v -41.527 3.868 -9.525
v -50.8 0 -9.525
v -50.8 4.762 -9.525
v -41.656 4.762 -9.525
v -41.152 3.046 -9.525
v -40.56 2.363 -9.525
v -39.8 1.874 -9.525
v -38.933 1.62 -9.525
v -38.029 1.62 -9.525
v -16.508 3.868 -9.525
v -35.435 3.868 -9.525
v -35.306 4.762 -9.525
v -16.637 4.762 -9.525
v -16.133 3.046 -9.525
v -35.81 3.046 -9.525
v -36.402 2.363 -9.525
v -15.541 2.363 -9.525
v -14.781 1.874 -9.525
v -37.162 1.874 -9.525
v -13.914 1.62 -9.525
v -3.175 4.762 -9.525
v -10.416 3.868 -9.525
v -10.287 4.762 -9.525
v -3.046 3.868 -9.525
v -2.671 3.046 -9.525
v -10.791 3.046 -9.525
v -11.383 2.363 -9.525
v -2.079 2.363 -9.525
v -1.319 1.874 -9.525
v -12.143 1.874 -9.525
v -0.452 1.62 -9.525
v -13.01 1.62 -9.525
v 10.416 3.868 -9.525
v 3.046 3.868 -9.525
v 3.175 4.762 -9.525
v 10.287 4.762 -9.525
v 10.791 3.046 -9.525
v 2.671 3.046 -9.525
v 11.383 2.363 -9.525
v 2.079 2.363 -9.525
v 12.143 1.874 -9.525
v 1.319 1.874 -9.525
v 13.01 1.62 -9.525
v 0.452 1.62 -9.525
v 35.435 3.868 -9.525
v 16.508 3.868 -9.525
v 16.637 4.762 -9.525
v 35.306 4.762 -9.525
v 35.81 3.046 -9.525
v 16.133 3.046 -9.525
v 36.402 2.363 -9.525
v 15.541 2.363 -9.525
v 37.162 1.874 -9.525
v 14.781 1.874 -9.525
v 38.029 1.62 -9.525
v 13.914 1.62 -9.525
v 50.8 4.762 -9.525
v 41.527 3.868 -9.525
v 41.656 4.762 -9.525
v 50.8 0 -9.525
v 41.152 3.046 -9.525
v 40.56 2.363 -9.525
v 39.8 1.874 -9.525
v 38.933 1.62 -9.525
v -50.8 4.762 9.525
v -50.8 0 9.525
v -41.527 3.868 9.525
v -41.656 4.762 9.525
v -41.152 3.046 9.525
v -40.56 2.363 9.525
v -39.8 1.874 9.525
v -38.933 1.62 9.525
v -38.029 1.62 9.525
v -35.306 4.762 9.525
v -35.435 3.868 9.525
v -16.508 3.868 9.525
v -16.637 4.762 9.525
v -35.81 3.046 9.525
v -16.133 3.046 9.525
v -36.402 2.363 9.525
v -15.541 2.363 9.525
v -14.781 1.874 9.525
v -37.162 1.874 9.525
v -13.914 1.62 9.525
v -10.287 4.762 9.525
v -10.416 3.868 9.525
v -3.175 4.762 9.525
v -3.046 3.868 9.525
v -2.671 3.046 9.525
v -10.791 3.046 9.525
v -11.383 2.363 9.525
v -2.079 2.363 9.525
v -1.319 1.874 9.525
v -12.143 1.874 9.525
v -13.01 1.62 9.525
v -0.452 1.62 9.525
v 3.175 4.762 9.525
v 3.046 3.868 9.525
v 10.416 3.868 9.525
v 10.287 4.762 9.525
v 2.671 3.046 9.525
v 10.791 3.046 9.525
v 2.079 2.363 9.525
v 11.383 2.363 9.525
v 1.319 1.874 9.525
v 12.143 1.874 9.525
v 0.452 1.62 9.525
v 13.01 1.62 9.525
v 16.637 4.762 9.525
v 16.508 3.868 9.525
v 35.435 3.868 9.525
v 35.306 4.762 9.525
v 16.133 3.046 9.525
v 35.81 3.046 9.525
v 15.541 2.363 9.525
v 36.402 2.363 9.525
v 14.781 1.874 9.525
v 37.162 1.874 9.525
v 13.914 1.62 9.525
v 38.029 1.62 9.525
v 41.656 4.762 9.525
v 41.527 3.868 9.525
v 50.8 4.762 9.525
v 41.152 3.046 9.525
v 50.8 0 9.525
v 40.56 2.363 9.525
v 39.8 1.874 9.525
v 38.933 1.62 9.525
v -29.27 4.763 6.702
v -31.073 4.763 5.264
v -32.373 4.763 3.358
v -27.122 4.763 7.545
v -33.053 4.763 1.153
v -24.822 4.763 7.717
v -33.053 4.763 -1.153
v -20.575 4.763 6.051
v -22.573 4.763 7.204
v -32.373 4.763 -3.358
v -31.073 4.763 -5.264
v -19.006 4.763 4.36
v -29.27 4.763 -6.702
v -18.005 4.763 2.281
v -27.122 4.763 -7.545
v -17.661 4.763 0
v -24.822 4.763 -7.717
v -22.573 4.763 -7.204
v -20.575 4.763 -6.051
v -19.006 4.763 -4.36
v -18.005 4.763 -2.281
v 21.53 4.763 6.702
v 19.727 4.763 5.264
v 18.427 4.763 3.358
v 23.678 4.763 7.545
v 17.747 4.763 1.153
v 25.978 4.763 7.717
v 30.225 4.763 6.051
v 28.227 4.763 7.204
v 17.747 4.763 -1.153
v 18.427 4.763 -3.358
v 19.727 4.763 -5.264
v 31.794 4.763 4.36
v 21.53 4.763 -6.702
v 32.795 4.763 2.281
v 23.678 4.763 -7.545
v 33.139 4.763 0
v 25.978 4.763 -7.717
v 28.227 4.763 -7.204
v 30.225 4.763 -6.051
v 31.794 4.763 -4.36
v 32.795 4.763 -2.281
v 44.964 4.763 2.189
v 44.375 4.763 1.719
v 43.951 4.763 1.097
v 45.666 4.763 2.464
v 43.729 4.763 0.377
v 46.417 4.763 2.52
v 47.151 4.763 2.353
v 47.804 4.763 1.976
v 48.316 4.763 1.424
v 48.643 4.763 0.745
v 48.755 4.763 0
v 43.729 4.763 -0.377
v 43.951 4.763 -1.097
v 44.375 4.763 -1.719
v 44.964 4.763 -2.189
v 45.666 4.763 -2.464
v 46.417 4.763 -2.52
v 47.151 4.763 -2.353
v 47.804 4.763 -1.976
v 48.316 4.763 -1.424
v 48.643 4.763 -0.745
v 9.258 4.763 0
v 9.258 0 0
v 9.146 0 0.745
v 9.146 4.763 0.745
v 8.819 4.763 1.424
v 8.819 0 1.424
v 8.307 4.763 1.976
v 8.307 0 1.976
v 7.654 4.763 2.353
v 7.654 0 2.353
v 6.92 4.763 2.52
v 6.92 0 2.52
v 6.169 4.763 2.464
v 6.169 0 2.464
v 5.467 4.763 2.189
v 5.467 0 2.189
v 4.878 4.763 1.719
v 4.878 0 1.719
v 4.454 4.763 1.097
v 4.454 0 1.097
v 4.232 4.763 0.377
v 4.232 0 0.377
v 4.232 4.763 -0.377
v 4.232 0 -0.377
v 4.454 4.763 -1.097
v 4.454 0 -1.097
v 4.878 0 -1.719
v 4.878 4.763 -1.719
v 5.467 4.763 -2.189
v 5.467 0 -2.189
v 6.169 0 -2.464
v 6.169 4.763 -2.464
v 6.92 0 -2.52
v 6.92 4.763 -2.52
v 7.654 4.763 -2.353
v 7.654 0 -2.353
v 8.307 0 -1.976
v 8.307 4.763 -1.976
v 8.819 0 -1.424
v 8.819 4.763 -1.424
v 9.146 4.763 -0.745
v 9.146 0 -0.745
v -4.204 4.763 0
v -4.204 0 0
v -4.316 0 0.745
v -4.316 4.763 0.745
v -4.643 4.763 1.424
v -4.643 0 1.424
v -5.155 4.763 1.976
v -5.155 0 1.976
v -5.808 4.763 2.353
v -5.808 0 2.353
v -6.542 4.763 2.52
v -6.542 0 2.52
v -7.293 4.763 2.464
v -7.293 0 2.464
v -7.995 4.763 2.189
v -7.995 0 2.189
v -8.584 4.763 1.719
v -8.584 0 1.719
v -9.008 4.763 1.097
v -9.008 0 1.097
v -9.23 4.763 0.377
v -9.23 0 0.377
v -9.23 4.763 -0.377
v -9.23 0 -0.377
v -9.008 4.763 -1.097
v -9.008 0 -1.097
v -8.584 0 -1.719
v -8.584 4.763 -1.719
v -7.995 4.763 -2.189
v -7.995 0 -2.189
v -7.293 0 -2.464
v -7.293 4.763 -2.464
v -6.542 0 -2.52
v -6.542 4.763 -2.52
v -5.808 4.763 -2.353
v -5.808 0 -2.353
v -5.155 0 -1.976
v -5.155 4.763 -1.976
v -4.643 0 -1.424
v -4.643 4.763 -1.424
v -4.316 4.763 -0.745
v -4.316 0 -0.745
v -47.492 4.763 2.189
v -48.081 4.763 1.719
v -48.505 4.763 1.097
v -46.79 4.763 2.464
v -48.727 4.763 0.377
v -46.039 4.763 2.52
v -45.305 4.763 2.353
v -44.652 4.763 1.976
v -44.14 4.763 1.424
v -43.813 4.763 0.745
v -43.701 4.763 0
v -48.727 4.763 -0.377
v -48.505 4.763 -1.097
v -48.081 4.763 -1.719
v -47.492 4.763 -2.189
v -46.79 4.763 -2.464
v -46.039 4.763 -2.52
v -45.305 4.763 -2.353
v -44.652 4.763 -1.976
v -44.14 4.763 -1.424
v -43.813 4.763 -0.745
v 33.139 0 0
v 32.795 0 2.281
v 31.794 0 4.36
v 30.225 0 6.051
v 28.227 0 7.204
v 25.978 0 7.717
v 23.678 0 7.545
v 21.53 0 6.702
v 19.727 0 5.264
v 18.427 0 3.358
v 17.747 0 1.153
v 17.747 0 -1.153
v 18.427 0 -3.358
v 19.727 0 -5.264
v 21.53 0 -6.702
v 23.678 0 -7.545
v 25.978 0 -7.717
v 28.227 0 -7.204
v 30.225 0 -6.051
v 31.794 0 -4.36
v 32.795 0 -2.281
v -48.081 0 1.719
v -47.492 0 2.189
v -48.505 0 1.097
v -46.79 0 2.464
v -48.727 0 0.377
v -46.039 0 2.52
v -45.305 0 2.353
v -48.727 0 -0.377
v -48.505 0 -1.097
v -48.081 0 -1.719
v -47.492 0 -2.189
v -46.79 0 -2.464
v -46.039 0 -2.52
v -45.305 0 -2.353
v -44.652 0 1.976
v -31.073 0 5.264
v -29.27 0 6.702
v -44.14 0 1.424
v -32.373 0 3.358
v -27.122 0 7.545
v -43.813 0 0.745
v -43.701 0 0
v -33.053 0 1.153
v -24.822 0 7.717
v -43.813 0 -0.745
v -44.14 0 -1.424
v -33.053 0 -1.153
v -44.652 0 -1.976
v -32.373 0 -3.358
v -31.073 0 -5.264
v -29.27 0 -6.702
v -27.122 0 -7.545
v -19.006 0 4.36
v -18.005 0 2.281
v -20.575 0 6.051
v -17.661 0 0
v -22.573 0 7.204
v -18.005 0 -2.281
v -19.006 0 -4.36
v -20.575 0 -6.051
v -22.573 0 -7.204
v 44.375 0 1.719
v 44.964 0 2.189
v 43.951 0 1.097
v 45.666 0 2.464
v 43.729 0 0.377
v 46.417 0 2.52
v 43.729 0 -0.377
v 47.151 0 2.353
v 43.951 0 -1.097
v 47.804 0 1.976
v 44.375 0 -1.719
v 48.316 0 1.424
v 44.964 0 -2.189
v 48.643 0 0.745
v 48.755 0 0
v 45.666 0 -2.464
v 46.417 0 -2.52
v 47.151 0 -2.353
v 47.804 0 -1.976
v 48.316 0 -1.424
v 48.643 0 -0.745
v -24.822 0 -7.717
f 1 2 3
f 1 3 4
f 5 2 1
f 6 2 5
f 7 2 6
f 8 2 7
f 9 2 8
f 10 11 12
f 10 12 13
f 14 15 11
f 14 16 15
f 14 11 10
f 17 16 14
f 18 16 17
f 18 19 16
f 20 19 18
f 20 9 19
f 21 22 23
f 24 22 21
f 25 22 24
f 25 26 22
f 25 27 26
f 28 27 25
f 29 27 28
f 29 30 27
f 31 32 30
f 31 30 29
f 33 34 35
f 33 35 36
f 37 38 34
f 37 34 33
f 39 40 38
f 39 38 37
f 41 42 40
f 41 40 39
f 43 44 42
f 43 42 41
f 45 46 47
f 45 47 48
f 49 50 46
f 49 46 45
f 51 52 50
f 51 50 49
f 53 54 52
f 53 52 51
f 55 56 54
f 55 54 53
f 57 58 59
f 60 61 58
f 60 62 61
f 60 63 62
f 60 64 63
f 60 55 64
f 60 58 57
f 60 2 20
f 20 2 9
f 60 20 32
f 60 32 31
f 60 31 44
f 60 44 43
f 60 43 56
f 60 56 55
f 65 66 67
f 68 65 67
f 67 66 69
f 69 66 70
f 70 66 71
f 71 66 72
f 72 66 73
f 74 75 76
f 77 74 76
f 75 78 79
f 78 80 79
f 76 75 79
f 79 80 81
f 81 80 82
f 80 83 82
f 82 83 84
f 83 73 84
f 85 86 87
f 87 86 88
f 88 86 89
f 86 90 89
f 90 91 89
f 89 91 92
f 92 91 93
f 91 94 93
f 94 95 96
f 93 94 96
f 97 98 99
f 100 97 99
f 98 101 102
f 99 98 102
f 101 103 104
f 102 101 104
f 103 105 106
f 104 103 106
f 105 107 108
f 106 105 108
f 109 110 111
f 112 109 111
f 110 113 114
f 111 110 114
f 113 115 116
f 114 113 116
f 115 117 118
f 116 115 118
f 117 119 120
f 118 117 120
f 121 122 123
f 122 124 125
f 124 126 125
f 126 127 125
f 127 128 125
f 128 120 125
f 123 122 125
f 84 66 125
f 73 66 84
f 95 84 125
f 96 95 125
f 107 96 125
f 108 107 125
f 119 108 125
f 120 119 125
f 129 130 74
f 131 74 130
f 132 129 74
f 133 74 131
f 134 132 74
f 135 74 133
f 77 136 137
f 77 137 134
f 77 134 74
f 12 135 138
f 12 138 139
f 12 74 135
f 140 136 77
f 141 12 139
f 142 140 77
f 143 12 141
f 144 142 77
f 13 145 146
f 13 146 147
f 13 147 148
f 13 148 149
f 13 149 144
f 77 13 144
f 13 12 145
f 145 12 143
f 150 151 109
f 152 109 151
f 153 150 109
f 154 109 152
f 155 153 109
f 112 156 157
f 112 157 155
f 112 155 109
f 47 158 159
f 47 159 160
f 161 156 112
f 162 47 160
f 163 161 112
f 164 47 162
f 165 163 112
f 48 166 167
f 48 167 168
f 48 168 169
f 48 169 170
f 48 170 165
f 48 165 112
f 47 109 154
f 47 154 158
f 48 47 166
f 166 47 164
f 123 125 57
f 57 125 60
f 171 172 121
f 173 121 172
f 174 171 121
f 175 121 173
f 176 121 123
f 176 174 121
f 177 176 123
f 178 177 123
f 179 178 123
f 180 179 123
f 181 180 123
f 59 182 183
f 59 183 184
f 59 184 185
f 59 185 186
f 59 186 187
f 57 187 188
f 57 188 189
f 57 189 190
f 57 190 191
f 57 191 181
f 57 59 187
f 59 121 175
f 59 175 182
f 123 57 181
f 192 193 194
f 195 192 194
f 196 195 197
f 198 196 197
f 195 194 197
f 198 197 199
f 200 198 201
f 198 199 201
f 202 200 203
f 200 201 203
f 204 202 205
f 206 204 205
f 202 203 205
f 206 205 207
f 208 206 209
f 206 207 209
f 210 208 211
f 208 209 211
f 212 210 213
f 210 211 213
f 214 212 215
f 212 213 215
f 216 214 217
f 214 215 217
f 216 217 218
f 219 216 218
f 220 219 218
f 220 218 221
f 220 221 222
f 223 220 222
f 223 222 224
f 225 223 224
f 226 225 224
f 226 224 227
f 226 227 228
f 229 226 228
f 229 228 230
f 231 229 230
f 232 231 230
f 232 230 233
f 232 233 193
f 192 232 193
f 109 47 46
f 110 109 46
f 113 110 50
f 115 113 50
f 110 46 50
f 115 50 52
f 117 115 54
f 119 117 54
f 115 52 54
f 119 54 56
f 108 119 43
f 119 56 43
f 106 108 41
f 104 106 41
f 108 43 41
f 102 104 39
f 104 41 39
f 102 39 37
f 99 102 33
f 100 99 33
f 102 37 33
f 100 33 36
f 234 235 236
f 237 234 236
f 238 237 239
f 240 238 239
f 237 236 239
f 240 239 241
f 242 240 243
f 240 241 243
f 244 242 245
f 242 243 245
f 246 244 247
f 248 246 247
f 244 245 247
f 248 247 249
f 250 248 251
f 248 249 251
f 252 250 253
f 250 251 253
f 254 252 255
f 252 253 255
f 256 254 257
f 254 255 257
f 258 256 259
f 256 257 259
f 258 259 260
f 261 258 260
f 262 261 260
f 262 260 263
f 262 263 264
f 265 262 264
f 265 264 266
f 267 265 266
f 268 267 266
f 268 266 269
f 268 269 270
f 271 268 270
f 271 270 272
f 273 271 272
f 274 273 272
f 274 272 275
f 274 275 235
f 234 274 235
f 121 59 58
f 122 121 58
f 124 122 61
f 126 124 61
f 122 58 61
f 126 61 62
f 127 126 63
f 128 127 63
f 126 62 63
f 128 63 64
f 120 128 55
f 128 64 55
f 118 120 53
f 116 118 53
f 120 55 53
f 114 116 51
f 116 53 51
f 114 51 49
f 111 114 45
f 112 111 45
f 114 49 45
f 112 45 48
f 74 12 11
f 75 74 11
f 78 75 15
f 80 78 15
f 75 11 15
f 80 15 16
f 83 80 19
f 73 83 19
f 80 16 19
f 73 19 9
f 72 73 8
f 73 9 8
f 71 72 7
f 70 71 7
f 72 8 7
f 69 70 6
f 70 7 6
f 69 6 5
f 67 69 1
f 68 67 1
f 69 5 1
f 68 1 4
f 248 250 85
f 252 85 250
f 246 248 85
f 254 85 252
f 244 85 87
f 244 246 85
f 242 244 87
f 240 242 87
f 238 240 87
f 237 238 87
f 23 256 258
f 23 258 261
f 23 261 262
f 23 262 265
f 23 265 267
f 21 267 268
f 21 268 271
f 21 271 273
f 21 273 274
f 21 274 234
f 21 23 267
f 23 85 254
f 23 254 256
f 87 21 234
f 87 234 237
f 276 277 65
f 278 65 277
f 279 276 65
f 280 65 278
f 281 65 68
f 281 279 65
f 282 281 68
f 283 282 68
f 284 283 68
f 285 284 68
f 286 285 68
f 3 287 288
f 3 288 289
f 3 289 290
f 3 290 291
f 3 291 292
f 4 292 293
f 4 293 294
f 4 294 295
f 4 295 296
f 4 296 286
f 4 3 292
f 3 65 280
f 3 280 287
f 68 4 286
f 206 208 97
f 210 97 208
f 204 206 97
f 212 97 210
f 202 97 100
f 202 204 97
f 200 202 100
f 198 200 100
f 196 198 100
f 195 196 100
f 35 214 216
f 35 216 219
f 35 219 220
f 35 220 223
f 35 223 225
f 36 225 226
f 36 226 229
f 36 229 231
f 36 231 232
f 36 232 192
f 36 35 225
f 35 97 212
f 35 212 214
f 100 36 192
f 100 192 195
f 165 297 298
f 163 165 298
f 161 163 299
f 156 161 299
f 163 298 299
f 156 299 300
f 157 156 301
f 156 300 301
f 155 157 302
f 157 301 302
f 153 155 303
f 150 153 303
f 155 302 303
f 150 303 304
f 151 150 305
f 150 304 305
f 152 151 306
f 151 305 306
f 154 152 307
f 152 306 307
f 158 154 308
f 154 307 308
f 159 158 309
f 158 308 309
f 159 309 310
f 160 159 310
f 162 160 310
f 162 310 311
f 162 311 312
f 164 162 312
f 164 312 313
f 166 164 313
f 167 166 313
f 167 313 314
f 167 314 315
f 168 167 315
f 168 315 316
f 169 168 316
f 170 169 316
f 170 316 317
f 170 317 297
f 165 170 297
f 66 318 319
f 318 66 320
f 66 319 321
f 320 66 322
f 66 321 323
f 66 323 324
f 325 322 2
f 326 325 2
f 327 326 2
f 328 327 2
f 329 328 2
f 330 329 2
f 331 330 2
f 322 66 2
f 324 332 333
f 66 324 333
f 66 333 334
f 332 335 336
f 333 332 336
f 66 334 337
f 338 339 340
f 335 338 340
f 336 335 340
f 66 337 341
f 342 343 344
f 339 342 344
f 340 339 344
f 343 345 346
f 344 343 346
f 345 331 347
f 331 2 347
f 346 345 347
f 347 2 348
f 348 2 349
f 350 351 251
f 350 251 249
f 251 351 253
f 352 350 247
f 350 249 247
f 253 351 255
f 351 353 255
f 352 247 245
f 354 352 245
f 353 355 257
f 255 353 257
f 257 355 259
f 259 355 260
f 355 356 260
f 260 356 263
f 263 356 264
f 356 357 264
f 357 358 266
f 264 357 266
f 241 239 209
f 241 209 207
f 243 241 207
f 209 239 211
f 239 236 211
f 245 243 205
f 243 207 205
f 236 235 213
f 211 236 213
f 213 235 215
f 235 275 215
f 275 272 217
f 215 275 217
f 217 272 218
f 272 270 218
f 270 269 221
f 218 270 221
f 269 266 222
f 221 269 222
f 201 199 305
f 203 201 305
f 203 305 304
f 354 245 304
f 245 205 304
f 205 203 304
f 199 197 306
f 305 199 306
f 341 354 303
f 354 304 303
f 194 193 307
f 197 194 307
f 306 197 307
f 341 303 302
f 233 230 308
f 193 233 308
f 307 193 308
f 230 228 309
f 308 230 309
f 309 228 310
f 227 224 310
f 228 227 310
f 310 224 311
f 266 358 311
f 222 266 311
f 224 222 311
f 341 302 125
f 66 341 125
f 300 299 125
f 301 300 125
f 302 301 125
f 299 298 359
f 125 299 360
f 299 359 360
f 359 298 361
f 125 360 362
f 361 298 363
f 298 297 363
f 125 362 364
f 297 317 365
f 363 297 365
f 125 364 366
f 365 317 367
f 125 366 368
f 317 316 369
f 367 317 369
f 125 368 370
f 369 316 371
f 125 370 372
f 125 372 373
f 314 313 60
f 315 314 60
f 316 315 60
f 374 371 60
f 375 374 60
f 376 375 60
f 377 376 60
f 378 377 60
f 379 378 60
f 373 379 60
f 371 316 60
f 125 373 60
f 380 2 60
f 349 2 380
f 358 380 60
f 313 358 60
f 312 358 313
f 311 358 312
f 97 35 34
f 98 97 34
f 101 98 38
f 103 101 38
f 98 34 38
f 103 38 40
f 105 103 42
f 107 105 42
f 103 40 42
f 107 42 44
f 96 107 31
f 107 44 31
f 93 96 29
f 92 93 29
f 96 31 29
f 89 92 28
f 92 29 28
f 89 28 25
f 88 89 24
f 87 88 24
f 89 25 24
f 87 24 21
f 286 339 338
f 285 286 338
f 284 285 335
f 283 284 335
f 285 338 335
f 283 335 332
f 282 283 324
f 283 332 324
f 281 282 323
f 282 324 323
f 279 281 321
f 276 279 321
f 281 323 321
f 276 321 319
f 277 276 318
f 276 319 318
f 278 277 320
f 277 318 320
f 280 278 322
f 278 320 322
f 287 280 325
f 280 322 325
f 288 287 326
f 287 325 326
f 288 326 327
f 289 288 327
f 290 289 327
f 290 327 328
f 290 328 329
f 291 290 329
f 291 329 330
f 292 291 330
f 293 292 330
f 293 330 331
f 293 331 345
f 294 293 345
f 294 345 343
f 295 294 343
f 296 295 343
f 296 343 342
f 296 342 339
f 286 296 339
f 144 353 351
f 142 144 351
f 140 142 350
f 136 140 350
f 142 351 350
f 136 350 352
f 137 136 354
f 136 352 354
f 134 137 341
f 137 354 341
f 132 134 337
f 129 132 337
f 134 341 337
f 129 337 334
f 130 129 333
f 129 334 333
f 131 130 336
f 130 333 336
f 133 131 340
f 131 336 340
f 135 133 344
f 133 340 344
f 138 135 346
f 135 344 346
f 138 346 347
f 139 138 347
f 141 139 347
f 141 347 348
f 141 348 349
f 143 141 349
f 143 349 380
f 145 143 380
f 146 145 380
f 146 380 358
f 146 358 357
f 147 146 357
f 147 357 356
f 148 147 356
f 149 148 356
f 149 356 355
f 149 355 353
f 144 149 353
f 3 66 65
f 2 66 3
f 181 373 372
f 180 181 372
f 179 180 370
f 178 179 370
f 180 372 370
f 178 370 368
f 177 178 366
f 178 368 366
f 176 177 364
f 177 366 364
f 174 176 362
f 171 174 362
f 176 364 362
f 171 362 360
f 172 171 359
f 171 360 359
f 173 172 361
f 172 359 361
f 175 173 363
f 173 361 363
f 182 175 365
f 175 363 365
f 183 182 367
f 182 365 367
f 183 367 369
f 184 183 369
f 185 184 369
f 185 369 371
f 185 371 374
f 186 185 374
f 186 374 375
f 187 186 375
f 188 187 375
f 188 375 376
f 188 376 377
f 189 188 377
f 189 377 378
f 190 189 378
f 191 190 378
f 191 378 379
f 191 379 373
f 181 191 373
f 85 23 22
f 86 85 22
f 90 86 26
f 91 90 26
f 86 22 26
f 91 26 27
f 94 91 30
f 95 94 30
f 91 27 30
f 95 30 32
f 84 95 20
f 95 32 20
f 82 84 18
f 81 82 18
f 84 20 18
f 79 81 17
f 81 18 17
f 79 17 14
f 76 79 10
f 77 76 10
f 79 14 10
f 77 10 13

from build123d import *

# Parameters (mm, degrees)
SKETCH1_W                        = 101.6
SKETCH1_H                        = 19.05
EXTRUDE1_DEPTH                   = 4.7625
F_39_64_0_60938_DIAMETER_HOLE1_D = 15.478252
F_1_4_0_25_DIAMETER_HOLE1_D      = 6.35
F_8_0_199_DIAMETER_HOLE1_D       = 5.0546


with BuildPart() as part:
    # Sketch1 → Extrude1 (new body)
    with BuildSketch(Plane(origin=(0, 0, 0), x_dir=(1, 0, 0), z_dir=(0, 1, 0))):
        Rectangle(SKETCH1_W, SKETCH1_H)
    extrude(amount=EXTRUDE1_DEPTH)

    # 39/64 (0.60938) Diameter Hole1 (through all)
    with Locations(Plane(origin=(0, 4.7625, 0), x_dir=(-1, 0, 0), z_dir=(0, 1, 0))):
        with Locations((25.4, 0), (-25.4, 0)):
            Hole(F_39_64_0_60938_DIAMETER_HOLE1_D / 2)

    # 1/4 (0.25) Diameter Hole1 (through all)
    with Locations(Plane.XY.offset(9.525)):
        with Locations((0, 4.7625), (-13.462, 4.7625), (13.462, 4.7625), (-38.481, 4.7625), (38.481, 4.7625)):
            Hole(F_1_4_0_25_DIAMETER_HOLE1_D / 2)

    # #8 (0.199) Diameter Hole1 (through all)
    with Locations(Plane(origin=(0, 4.7625, 0), x_dir=(-1, 0, 0), z_dir=(0, 1, 0))):
        with Locations((-46.228, 0), (-6.731, 0), (6.731, 0), (46.228, 0)):
            Hole(F_8_0_199_DIAMETER_HOLE1_D / 2)


solid = part.part
